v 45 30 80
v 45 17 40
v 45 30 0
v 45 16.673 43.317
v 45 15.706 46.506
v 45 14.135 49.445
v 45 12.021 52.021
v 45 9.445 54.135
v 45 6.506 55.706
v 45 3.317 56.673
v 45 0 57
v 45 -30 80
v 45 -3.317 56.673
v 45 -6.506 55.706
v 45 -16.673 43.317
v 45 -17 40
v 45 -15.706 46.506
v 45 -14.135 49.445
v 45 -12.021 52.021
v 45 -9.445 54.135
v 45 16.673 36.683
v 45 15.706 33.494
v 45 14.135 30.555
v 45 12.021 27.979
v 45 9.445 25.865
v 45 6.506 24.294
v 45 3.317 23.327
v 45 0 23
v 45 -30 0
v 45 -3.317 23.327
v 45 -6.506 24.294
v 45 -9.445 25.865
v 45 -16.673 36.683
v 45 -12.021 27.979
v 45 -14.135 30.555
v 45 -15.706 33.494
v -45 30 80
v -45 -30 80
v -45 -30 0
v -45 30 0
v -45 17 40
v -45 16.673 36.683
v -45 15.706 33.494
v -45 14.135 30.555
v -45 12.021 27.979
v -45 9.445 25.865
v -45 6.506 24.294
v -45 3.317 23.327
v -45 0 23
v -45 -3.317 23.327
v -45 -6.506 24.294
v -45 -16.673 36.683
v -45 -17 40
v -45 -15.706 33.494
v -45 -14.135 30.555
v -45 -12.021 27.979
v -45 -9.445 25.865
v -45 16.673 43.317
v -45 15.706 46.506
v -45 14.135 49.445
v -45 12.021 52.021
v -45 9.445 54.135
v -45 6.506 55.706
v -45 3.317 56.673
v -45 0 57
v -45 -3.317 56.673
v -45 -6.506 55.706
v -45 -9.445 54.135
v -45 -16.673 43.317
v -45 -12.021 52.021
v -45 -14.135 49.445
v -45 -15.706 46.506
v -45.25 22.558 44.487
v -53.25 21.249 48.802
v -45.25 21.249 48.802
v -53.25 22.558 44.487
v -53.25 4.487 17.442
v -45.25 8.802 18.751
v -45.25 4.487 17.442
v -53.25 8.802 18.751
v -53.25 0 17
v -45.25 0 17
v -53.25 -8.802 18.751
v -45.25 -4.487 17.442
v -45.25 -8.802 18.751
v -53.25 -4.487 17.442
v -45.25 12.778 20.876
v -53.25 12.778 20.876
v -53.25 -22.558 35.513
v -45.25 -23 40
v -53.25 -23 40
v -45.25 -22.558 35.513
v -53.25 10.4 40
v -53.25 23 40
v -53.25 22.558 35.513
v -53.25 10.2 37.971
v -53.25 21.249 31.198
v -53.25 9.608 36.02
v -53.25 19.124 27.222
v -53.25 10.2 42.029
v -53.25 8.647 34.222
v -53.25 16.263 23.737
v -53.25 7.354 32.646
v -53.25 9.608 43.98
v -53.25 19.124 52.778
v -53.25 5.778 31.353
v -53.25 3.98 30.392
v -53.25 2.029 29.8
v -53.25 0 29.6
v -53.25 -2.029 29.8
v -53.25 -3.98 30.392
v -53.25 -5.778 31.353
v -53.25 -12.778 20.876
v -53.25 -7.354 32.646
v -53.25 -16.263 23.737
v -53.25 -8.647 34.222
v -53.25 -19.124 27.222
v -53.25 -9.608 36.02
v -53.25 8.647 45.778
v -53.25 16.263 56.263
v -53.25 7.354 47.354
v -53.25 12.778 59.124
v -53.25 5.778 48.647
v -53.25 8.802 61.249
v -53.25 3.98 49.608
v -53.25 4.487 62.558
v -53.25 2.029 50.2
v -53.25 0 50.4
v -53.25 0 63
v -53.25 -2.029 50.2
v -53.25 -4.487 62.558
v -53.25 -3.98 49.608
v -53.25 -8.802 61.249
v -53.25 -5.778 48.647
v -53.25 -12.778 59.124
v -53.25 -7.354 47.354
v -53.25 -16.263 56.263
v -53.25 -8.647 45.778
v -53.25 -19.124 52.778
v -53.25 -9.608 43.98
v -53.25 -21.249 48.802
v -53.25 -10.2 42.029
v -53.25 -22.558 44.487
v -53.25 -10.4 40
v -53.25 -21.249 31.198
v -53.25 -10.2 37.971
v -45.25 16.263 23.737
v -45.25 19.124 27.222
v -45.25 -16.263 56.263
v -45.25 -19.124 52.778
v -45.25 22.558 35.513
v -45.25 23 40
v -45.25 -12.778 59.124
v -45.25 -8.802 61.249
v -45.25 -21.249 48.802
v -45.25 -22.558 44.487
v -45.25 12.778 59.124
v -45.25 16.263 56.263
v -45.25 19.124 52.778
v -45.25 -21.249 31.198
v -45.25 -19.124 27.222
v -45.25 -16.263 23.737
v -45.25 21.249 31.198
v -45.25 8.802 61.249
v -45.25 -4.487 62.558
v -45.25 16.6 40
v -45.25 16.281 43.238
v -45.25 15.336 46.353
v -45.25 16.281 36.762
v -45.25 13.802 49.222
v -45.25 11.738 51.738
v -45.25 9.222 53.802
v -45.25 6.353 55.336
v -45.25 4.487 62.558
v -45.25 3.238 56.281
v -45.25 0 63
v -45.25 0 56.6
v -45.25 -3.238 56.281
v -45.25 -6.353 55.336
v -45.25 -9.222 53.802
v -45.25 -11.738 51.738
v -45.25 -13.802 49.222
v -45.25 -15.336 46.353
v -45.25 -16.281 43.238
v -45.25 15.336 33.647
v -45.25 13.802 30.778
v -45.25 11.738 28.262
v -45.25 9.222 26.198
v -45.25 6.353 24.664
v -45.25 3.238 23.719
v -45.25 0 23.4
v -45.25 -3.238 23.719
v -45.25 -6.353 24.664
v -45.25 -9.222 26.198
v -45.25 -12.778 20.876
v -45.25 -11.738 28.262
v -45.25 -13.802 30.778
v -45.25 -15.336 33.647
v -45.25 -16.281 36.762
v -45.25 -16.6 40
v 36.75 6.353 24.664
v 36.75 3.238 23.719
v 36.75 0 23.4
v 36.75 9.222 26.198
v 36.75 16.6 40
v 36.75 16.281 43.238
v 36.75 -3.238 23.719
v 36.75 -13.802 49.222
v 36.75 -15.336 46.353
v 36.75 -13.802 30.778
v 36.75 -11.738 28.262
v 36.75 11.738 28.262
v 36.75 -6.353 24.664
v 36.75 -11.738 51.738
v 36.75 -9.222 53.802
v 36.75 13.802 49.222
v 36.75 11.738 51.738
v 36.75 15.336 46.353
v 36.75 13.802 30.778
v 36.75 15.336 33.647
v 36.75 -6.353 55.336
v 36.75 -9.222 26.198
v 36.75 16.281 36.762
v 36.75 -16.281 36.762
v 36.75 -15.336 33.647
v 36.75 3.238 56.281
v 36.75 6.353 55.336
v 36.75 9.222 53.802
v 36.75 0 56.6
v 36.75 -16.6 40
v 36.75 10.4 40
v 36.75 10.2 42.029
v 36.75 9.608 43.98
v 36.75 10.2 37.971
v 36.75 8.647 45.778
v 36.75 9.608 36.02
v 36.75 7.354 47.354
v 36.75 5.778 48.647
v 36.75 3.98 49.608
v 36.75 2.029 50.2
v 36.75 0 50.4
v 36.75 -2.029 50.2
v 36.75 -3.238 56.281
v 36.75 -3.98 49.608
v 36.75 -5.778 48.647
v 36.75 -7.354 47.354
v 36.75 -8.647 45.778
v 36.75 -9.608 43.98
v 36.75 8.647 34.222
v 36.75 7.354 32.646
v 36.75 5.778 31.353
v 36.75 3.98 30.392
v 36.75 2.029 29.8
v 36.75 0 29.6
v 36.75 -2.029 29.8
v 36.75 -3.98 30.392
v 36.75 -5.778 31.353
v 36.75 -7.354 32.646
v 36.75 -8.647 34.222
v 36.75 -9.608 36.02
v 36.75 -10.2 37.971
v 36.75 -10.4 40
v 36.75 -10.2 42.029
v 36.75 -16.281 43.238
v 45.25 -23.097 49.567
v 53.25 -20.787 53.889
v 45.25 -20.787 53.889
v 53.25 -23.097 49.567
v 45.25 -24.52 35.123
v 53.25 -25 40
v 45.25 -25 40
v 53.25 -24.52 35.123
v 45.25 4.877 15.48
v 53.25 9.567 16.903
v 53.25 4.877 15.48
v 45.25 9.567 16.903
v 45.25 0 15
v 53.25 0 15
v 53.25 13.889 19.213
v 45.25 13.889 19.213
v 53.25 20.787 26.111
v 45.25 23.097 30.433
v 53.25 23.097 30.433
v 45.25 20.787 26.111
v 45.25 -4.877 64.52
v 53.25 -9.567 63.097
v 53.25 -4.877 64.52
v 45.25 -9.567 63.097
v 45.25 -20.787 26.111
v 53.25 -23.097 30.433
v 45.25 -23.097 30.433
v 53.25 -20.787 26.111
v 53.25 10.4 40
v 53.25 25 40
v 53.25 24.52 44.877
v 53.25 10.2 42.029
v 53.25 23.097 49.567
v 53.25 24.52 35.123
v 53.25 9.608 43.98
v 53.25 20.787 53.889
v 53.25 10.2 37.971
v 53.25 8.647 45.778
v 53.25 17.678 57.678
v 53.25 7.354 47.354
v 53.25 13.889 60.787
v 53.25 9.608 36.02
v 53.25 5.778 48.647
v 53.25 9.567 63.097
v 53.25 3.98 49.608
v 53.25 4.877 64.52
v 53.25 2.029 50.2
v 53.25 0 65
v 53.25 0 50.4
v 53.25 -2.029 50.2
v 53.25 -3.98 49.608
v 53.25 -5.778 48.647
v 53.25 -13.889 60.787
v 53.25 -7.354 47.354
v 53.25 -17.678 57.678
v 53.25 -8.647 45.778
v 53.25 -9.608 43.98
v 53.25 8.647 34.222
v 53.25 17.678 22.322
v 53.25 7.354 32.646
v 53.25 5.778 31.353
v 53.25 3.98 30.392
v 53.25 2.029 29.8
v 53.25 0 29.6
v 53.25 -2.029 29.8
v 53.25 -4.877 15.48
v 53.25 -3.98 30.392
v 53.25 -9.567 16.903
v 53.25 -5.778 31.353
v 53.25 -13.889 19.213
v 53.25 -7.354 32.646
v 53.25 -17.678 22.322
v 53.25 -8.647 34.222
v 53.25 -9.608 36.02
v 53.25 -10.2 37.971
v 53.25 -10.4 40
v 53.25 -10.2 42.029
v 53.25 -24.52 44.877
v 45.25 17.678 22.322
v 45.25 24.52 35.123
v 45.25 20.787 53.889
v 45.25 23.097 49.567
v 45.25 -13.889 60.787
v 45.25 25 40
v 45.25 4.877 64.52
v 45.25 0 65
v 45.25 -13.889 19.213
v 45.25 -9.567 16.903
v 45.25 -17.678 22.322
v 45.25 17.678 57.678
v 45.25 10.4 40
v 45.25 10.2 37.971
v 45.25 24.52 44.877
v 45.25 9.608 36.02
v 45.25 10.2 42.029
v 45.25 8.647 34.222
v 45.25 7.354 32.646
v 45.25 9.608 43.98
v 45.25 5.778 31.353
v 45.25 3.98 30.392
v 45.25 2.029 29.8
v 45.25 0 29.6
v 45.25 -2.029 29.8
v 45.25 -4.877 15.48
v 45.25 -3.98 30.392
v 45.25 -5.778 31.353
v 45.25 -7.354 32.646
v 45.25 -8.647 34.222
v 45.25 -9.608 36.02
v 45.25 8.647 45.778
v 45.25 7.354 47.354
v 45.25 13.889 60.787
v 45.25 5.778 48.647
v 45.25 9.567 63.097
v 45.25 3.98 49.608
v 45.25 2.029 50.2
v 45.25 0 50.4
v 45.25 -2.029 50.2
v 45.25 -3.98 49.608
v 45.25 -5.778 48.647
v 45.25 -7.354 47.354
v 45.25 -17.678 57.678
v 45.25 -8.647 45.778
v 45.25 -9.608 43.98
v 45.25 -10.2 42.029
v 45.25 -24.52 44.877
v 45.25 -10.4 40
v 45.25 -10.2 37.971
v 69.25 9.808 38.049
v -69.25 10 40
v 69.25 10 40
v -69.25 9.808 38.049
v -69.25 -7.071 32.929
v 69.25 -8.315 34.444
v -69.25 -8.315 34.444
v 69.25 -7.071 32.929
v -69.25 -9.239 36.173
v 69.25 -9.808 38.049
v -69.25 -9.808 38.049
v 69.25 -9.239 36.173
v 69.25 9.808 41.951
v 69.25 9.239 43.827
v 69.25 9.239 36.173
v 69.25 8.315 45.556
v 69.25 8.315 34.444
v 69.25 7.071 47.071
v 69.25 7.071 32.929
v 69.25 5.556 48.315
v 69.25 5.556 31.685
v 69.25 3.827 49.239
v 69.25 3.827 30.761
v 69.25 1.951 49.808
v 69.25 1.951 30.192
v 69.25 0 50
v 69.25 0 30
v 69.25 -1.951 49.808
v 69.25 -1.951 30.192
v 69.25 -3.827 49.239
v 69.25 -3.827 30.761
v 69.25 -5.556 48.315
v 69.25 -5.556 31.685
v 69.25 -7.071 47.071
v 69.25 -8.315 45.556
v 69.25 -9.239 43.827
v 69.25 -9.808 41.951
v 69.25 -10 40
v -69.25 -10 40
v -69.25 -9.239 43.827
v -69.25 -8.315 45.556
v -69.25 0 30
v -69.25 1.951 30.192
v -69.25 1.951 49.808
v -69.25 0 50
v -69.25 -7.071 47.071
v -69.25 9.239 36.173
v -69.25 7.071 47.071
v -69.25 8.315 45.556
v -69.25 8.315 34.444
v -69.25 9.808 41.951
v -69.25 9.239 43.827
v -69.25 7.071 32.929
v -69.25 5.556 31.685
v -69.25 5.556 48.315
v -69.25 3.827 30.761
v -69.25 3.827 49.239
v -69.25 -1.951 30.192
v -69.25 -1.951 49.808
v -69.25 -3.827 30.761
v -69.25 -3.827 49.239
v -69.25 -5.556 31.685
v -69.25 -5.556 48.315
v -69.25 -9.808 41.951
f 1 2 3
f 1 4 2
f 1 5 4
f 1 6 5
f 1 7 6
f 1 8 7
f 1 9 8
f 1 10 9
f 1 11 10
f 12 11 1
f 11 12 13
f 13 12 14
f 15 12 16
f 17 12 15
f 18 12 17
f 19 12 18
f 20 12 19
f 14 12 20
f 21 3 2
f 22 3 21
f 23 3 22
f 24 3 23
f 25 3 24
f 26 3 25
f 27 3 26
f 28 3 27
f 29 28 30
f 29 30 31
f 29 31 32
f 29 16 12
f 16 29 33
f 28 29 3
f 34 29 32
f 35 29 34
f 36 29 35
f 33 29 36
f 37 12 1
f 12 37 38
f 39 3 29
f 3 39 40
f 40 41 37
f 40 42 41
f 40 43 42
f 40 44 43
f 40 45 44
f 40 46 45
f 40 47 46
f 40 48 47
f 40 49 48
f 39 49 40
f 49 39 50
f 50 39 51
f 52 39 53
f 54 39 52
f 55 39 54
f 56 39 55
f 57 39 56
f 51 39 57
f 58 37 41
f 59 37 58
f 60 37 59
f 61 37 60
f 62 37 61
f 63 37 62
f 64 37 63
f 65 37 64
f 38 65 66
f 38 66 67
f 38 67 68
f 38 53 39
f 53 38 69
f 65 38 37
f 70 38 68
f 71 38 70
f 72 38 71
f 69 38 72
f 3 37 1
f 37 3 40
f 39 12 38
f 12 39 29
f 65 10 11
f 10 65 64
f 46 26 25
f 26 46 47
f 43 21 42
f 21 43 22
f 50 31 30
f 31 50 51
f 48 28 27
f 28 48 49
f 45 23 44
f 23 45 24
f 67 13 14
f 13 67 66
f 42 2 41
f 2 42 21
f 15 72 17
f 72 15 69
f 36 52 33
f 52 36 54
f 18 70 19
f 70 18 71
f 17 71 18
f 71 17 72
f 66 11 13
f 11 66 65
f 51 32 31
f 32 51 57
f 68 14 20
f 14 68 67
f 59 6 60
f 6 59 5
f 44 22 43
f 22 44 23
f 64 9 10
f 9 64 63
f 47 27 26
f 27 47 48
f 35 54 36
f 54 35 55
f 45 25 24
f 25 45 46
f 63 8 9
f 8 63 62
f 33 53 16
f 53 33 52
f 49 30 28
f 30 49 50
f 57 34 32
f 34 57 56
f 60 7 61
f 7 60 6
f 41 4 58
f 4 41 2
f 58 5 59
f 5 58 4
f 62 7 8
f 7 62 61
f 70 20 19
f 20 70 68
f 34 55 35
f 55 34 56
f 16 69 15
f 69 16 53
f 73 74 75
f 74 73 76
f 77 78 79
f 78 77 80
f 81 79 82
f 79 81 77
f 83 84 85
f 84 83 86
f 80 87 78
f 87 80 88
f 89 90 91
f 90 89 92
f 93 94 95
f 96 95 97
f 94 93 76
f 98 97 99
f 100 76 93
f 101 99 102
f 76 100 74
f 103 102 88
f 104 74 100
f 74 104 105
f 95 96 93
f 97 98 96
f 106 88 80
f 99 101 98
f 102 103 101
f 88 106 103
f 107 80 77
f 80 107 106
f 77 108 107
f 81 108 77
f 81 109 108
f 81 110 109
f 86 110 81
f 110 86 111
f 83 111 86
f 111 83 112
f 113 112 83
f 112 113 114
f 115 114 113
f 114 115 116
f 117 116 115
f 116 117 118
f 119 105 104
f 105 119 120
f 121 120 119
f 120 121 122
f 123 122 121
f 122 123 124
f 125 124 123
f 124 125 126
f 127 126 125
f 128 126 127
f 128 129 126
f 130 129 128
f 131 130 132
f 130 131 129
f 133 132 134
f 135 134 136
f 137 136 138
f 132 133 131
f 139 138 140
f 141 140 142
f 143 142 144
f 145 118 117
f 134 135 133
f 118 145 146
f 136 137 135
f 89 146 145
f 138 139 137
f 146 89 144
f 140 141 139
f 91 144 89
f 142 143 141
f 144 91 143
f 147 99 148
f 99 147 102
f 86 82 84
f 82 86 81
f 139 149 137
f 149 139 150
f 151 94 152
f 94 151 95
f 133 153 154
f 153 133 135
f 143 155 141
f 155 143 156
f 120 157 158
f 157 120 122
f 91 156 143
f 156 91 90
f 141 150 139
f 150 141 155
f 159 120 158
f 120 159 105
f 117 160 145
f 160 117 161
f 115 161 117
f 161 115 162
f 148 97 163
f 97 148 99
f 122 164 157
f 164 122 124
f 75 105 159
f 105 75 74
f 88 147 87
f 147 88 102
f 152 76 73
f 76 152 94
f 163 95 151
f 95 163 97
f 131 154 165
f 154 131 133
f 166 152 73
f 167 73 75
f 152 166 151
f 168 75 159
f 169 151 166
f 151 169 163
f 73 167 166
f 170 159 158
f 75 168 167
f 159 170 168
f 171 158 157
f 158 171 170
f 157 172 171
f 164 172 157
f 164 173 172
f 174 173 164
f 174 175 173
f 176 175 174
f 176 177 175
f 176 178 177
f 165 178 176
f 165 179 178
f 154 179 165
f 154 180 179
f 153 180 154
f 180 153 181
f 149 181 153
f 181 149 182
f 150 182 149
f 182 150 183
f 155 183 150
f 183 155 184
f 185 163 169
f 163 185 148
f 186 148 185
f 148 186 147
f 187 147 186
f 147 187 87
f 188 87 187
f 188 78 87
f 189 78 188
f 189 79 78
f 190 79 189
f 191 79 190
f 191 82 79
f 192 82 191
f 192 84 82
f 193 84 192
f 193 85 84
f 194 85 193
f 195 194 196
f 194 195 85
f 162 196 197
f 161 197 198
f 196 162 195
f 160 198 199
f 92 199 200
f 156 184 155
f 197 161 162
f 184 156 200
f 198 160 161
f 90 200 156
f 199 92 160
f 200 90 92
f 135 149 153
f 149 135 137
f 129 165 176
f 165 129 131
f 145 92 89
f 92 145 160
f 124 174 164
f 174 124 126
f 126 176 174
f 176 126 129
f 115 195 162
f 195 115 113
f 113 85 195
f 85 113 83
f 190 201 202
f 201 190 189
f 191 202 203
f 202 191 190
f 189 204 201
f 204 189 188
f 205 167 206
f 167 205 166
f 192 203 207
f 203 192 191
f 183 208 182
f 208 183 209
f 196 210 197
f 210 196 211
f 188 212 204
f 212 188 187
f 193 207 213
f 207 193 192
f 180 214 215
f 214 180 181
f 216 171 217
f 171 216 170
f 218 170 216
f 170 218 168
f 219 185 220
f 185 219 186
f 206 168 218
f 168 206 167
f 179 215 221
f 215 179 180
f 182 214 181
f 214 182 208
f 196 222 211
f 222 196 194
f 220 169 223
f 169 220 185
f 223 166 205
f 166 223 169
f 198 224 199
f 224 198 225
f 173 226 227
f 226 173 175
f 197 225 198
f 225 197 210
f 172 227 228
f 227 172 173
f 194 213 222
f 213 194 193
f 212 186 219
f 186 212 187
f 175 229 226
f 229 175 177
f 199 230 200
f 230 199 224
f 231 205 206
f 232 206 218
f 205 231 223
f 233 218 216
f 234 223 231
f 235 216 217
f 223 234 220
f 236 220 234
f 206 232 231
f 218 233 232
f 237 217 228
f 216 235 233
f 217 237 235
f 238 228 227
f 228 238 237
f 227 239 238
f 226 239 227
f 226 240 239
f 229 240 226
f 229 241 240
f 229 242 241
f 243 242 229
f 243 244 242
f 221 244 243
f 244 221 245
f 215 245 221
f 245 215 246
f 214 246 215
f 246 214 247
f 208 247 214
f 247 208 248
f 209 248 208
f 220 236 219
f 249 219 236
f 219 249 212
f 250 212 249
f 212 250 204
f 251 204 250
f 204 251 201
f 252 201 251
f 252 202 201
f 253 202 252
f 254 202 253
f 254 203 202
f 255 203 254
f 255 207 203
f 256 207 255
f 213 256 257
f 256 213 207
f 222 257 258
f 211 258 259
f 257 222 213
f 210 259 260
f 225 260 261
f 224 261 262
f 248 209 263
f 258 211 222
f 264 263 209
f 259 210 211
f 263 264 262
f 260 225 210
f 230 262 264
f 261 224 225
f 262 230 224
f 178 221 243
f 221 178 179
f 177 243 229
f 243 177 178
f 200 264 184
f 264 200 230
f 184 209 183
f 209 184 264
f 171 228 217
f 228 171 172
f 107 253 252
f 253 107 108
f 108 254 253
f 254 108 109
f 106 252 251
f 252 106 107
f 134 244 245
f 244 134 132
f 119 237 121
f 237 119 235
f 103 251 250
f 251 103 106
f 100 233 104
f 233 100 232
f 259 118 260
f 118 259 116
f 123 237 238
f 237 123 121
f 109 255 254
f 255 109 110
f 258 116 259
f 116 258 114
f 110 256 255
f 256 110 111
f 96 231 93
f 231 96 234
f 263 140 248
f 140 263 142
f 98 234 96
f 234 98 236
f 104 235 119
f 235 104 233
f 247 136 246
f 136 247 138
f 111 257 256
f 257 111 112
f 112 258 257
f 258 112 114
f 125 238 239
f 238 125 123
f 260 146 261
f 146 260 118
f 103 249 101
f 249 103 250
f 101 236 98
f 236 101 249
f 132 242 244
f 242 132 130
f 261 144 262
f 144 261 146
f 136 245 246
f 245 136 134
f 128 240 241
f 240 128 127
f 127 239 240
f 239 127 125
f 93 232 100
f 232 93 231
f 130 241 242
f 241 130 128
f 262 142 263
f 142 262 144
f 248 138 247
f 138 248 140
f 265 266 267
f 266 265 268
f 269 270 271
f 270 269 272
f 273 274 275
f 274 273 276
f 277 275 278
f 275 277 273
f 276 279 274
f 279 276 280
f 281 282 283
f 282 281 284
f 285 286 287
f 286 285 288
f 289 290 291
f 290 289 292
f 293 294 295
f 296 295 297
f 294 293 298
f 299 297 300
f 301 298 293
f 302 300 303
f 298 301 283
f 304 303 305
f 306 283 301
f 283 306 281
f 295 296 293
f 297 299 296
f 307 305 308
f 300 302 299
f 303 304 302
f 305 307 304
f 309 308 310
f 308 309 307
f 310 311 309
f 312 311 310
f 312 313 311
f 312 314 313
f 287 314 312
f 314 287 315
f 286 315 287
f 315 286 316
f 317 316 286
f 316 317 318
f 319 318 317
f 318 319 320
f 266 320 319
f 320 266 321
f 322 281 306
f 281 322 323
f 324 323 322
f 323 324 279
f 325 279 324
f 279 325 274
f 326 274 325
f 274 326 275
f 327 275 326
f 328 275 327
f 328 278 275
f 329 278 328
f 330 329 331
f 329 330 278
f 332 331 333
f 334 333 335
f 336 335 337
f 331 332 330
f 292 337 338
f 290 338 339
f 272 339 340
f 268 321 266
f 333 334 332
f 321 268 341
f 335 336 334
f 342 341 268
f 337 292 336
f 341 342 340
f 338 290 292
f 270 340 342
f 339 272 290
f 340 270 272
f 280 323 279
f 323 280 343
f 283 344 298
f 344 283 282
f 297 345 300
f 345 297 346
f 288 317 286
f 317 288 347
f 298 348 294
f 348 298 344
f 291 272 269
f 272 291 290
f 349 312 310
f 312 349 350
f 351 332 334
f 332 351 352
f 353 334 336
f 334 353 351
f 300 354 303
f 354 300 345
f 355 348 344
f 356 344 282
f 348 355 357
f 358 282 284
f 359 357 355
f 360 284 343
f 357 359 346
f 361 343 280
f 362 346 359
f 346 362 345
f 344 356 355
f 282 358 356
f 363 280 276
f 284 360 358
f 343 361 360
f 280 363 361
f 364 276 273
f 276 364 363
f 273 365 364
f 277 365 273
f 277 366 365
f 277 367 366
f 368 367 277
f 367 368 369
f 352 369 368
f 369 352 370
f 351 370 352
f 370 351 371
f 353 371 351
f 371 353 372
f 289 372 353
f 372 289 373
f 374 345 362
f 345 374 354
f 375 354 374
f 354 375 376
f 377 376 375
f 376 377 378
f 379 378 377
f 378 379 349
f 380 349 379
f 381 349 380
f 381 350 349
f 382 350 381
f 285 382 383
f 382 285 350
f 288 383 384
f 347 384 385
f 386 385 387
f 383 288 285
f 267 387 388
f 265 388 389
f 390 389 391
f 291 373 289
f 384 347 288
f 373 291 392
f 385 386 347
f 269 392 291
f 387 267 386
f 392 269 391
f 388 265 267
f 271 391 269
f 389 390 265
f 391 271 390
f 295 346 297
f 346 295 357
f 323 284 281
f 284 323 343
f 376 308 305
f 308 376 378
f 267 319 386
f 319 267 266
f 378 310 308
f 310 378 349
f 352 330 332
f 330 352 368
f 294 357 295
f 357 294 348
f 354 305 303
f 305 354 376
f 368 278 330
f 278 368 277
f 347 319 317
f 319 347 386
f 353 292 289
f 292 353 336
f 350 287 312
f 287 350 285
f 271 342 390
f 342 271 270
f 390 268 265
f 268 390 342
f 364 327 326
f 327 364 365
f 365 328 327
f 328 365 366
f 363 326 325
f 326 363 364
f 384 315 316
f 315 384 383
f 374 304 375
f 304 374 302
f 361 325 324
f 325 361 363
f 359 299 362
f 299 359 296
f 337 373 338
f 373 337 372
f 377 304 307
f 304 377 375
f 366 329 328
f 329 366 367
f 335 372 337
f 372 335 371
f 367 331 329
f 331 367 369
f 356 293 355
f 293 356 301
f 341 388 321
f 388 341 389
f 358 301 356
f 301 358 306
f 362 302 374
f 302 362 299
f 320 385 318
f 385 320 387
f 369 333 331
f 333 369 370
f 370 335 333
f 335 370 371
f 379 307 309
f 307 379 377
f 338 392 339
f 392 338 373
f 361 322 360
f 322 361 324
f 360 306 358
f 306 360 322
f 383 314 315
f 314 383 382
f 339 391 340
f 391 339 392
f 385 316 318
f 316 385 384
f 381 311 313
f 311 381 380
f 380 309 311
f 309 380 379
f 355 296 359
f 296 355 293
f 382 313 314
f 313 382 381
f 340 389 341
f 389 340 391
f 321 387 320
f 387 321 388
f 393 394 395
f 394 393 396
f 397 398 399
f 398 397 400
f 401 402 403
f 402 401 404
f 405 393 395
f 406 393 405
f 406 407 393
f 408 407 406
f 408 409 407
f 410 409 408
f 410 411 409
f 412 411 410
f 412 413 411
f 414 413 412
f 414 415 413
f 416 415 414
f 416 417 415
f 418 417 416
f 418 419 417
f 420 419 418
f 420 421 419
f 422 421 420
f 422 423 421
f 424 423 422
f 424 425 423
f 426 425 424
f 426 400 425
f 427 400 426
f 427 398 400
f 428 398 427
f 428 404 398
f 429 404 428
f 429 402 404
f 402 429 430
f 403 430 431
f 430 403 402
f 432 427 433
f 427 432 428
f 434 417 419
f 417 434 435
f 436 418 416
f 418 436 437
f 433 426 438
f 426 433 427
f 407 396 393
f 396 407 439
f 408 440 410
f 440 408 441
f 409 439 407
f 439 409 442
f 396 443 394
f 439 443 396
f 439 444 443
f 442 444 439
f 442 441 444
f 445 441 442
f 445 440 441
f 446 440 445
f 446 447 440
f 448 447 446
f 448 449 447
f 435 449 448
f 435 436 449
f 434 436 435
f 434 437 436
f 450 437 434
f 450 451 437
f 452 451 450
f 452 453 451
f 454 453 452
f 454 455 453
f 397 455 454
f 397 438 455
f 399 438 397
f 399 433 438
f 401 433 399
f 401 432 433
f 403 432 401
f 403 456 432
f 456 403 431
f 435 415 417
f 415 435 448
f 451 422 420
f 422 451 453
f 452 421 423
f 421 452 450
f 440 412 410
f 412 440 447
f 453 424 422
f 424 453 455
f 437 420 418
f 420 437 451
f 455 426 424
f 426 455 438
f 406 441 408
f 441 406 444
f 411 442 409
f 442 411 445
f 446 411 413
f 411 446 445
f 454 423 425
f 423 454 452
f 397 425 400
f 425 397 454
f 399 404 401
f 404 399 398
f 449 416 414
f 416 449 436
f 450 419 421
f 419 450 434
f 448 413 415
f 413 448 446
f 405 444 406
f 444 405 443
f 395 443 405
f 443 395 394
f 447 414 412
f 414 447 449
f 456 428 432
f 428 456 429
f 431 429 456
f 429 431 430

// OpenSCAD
$fn = 32;

// ------------------------------------------------------------------------
// Bushed housing: 90 x 60 x 80 mm housing, bushing d33.2
// Every part is its own module, assembly() places them once.
// ------------------------------------------------------------------------

// --- part 1 ---
module housing() {
  difference() {
    translate([-45, -30, 0]) cube([90, 60, 80]);
    translate([0, 0, 40]) rotate([0, 90, 0]) cylinder(h = 92, d = 34, center = true);
  }
}

// --- part 2 ---
module bushing() {
  difference() {
    union() {
      cylinder(h = 8, d = 46);
      translate([0, 0, 8]) cylinder(h = 82, d = 33.2);
    }
    translate([0, 0, -1]) cylinder(h = 92, d = 20.8);
  }
}

// --- part 3 ---
module shaft() {
  translate([0, 0, -69.25]) cylinder(h = 138.5, d = 20);
}

// --- part 4 ---
module cover() {
  difference() {
    cylinder(h = 8, d = 50);
    translate([0, 0, -1]) cylinder(h = 10, d = 20.8);
  }
}

// --- assembly ---
module assembly() {
  translate([0, 0, 0]) rotate([0, 0, 0]) housing();
  translate([-53.25, 0, 40]) rotate([0, 90, 0]) bushing();
  translate([0, 0, 40]) rotate([0, 90, 0]) shaft();
  translate([45.25, 0, 40]) rotate([0, 90, 0]) cover();
}

assembly();
